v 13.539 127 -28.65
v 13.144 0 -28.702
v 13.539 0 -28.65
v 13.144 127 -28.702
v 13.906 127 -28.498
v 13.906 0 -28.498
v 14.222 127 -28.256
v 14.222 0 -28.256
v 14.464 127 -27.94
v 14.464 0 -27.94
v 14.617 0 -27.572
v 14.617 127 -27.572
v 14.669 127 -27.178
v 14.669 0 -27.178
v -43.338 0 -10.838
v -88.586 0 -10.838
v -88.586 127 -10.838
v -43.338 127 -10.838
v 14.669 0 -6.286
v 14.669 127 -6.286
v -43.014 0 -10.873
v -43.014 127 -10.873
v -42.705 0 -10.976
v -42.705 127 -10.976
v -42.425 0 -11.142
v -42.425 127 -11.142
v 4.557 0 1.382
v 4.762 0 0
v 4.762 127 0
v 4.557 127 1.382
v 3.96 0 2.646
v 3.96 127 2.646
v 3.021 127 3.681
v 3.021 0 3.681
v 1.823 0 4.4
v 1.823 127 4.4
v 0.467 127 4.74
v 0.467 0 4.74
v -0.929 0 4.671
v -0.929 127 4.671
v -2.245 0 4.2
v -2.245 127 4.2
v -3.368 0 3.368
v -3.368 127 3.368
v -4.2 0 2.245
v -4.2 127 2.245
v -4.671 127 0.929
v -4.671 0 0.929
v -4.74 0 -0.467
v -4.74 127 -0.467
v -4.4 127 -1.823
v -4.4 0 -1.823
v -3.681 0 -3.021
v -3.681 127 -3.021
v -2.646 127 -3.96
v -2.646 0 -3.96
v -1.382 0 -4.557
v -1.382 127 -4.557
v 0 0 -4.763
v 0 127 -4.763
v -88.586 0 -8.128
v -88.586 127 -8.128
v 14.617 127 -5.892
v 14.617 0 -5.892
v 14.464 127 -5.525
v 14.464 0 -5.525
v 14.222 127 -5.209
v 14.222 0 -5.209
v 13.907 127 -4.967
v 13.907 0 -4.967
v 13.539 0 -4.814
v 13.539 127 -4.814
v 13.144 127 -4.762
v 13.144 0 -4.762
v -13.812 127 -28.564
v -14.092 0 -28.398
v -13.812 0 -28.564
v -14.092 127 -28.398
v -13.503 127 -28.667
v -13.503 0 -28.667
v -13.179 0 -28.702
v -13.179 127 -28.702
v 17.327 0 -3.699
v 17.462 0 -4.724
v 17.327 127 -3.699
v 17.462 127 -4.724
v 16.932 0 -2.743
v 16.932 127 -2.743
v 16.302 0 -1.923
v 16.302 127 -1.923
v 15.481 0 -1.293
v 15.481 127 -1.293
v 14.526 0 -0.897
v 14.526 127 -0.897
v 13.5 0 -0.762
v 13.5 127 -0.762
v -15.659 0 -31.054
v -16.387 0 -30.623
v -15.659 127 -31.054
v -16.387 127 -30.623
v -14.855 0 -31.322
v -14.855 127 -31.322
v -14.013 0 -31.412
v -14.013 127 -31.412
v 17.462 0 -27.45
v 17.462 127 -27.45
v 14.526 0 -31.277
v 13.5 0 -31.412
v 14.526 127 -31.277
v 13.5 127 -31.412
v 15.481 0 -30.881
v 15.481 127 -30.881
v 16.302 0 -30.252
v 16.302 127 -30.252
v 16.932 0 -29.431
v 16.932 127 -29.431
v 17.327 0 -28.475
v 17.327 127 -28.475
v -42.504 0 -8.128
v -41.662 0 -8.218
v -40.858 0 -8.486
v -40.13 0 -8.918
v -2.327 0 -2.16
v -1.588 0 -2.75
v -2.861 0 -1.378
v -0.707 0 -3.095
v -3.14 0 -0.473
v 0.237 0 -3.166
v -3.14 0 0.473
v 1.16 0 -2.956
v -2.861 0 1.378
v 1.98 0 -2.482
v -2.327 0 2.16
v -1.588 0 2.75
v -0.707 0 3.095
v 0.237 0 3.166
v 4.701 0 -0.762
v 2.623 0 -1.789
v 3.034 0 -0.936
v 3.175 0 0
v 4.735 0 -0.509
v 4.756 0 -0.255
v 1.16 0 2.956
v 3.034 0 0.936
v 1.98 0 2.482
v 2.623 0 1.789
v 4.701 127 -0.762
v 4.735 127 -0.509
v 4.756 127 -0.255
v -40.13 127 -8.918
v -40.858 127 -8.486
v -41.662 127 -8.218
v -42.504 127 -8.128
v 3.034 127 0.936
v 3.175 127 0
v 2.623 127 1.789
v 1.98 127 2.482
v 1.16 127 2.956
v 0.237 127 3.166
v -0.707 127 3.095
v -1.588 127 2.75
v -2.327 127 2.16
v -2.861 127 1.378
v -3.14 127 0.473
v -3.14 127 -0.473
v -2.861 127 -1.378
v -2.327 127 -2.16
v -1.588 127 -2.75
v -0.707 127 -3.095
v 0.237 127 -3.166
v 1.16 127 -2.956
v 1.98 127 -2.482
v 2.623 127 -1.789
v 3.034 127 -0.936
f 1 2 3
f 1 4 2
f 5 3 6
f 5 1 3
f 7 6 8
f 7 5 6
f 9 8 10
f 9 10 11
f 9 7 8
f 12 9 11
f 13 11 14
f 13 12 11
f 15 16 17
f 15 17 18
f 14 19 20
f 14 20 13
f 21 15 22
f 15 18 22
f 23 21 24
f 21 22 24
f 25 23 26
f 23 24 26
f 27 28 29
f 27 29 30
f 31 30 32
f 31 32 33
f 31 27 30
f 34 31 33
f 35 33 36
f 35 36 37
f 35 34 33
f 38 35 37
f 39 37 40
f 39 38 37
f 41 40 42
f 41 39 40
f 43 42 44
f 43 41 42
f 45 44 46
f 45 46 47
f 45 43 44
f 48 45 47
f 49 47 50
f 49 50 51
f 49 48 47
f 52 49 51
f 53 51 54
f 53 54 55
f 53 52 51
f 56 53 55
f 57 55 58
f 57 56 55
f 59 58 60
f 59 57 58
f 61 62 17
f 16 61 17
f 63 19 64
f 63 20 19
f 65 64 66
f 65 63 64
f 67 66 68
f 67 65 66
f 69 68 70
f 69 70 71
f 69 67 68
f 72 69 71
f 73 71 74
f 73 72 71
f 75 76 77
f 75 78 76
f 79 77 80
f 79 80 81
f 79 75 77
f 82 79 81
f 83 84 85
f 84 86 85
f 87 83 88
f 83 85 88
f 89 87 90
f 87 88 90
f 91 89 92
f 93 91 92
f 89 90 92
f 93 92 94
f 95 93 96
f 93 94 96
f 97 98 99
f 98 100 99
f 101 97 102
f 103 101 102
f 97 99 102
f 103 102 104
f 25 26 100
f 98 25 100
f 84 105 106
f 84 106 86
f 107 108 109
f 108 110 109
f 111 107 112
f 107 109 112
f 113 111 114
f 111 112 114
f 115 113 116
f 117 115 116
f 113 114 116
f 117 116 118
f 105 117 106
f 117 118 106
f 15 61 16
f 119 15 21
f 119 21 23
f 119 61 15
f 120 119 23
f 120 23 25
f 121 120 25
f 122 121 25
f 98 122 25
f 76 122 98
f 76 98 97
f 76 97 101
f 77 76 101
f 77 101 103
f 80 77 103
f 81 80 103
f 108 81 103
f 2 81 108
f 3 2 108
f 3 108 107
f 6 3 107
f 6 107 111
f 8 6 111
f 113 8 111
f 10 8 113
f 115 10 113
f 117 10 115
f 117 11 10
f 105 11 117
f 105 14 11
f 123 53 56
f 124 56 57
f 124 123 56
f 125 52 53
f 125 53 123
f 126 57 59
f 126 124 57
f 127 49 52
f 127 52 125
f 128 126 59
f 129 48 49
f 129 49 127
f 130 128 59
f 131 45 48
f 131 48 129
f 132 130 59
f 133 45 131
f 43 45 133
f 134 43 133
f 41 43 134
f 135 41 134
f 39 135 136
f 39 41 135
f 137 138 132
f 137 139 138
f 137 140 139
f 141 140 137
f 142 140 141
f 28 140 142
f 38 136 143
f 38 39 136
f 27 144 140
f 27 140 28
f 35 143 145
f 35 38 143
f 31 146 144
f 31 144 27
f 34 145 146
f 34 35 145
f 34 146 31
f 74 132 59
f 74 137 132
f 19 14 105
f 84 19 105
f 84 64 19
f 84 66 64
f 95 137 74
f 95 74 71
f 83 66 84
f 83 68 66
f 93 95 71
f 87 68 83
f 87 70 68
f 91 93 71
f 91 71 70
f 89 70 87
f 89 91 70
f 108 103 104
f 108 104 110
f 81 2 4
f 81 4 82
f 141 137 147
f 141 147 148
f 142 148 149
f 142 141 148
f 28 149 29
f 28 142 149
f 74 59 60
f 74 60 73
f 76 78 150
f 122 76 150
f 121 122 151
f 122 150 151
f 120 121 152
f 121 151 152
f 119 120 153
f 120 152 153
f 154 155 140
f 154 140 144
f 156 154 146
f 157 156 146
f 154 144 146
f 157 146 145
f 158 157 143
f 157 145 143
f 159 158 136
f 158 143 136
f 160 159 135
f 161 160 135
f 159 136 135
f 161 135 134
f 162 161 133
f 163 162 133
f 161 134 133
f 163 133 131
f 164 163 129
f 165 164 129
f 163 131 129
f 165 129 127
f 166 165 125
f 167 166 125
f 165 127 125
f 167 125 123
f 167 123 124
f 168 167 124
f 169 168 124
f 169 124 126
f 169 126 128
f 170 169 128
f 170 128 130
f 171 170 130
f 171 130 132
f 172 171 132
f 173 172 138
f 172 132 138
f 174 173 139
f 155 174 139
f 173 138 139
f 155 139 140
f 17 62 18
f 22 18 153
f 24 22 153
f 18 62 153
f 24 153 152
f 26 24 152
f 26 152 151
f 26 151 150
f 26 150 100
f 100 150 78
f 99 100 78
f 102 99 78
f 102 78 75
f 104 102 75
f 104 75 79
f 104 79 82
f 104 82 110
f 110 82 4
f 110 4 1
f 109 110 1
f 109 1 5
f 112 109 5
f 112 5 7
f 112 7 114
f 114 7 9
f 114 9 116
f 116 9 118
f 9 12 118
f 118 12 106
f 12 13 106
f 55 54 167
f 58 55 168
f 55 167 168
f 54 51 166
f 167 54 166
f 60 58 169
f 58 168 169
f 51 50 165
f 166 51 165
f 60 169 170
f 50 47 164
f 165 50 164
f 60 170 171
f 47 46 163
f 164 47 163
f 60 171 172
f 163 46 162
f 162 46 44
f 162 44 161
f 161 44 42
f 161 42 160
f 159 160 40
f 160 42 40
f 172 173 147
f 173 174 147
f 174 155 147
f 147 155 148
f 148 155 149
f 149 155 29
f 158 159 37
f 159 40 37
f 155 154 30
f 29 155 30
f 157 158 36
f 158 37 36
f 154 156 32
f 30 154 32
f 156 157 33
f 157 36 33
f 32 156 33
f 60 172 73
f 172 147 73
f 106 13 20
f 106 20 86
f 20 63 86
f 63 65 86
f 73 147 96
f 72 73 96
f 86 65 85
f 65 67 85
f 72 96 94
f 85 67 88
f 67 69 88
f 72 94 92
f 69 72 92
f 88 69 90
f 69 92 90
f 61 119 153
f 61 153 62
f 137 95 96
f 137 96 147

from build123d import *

# Parameters (mm, degrees)
F0_R     = 3.175
F1_DEPTH = 127
F2_R     = 3.9624
F3_R     = 1.524


# Not quite as in the source:
# - a feature names something its author has since deleted; it is built from what else it names


with BuildPart() as f1:
    # F0 (on Front) → F1 (new body)
    with BuildSketch(Plane.XZ):
        with BuildLine():
            ThreePointArc((4.7011447808, -0.762), (4.7471364141, -0.3822330647), (4.7625, 0))
            ThreePointArc((4.7625, 0), (-3.3675960454, 3.3675960454), (0, -4.7625))
            ThreePointArc((0, -4.7625), (3.0864527576, -3.6270119417), (4.7011447808, -0.762))
        make_face()
        Circle(F0_R, mode=Mode.SUBTRACT)
        with BuildLine():
            ThreePointArc((4.7011447808, -0.762), (3.0864527576, -3.6270119417), (0, -4.7625))
            Line((0, -4.7625), (14.6685, -4.7625))
            Line((14.6685, -4.7625), (14.6685, -28.702))
            Line((14.6685, -28.702), (-13.6858972215, -28.702))
            Line((-13.6858972215, -28.702), (-41.1854304771, -8.128))
            Line((-41.1854304771, -8.128), (-88.58598171, -8.128))
            Line((-88.58598171, -8.128), (-88.58598171, -10.83818))
            Line((-88.58598171, -10.83818), (-42.8310789114, -10.83818))
            Line((-42.8310789114, -10.83818), (-15.3315456557, -31.41218))
            Line((-15.3315456557, -31.41218), (17.4625, -31.41218))
            Line((17.4625, -31.41218), (17.4625, -0.762))
            Line((17.4625, -0.762), (4.7011447808, -0.762))
        make_face()
    extrude(amount=-F1_DEPTH)

    # F2
    f2_edges = [f1.edges().sort_by_distance(p)[0] for p in [
        (17.4625, 63.5, -0.762),
        (-15.331546, 63.5, -31.41218),
        (-41.18543, 63.5, -8.128),
        (17.4625, 63.5, -31.41218),
    ]]
    fillet(f2_edges, radius=F2_R)

    # F3
    f3_edges = [f1.edges().sort_by_distance(p)[0] for p in [
        (14.6685, 63.5, -4.7625),
        (-13.685897, 63.5, -28.702),
        (-42.831079, 63.5, -10.83818),
        (14.6685, 63.5, -28.702),
    ]]
    fillet(f3_edges, radius=F3_R)


solid = f1.part
